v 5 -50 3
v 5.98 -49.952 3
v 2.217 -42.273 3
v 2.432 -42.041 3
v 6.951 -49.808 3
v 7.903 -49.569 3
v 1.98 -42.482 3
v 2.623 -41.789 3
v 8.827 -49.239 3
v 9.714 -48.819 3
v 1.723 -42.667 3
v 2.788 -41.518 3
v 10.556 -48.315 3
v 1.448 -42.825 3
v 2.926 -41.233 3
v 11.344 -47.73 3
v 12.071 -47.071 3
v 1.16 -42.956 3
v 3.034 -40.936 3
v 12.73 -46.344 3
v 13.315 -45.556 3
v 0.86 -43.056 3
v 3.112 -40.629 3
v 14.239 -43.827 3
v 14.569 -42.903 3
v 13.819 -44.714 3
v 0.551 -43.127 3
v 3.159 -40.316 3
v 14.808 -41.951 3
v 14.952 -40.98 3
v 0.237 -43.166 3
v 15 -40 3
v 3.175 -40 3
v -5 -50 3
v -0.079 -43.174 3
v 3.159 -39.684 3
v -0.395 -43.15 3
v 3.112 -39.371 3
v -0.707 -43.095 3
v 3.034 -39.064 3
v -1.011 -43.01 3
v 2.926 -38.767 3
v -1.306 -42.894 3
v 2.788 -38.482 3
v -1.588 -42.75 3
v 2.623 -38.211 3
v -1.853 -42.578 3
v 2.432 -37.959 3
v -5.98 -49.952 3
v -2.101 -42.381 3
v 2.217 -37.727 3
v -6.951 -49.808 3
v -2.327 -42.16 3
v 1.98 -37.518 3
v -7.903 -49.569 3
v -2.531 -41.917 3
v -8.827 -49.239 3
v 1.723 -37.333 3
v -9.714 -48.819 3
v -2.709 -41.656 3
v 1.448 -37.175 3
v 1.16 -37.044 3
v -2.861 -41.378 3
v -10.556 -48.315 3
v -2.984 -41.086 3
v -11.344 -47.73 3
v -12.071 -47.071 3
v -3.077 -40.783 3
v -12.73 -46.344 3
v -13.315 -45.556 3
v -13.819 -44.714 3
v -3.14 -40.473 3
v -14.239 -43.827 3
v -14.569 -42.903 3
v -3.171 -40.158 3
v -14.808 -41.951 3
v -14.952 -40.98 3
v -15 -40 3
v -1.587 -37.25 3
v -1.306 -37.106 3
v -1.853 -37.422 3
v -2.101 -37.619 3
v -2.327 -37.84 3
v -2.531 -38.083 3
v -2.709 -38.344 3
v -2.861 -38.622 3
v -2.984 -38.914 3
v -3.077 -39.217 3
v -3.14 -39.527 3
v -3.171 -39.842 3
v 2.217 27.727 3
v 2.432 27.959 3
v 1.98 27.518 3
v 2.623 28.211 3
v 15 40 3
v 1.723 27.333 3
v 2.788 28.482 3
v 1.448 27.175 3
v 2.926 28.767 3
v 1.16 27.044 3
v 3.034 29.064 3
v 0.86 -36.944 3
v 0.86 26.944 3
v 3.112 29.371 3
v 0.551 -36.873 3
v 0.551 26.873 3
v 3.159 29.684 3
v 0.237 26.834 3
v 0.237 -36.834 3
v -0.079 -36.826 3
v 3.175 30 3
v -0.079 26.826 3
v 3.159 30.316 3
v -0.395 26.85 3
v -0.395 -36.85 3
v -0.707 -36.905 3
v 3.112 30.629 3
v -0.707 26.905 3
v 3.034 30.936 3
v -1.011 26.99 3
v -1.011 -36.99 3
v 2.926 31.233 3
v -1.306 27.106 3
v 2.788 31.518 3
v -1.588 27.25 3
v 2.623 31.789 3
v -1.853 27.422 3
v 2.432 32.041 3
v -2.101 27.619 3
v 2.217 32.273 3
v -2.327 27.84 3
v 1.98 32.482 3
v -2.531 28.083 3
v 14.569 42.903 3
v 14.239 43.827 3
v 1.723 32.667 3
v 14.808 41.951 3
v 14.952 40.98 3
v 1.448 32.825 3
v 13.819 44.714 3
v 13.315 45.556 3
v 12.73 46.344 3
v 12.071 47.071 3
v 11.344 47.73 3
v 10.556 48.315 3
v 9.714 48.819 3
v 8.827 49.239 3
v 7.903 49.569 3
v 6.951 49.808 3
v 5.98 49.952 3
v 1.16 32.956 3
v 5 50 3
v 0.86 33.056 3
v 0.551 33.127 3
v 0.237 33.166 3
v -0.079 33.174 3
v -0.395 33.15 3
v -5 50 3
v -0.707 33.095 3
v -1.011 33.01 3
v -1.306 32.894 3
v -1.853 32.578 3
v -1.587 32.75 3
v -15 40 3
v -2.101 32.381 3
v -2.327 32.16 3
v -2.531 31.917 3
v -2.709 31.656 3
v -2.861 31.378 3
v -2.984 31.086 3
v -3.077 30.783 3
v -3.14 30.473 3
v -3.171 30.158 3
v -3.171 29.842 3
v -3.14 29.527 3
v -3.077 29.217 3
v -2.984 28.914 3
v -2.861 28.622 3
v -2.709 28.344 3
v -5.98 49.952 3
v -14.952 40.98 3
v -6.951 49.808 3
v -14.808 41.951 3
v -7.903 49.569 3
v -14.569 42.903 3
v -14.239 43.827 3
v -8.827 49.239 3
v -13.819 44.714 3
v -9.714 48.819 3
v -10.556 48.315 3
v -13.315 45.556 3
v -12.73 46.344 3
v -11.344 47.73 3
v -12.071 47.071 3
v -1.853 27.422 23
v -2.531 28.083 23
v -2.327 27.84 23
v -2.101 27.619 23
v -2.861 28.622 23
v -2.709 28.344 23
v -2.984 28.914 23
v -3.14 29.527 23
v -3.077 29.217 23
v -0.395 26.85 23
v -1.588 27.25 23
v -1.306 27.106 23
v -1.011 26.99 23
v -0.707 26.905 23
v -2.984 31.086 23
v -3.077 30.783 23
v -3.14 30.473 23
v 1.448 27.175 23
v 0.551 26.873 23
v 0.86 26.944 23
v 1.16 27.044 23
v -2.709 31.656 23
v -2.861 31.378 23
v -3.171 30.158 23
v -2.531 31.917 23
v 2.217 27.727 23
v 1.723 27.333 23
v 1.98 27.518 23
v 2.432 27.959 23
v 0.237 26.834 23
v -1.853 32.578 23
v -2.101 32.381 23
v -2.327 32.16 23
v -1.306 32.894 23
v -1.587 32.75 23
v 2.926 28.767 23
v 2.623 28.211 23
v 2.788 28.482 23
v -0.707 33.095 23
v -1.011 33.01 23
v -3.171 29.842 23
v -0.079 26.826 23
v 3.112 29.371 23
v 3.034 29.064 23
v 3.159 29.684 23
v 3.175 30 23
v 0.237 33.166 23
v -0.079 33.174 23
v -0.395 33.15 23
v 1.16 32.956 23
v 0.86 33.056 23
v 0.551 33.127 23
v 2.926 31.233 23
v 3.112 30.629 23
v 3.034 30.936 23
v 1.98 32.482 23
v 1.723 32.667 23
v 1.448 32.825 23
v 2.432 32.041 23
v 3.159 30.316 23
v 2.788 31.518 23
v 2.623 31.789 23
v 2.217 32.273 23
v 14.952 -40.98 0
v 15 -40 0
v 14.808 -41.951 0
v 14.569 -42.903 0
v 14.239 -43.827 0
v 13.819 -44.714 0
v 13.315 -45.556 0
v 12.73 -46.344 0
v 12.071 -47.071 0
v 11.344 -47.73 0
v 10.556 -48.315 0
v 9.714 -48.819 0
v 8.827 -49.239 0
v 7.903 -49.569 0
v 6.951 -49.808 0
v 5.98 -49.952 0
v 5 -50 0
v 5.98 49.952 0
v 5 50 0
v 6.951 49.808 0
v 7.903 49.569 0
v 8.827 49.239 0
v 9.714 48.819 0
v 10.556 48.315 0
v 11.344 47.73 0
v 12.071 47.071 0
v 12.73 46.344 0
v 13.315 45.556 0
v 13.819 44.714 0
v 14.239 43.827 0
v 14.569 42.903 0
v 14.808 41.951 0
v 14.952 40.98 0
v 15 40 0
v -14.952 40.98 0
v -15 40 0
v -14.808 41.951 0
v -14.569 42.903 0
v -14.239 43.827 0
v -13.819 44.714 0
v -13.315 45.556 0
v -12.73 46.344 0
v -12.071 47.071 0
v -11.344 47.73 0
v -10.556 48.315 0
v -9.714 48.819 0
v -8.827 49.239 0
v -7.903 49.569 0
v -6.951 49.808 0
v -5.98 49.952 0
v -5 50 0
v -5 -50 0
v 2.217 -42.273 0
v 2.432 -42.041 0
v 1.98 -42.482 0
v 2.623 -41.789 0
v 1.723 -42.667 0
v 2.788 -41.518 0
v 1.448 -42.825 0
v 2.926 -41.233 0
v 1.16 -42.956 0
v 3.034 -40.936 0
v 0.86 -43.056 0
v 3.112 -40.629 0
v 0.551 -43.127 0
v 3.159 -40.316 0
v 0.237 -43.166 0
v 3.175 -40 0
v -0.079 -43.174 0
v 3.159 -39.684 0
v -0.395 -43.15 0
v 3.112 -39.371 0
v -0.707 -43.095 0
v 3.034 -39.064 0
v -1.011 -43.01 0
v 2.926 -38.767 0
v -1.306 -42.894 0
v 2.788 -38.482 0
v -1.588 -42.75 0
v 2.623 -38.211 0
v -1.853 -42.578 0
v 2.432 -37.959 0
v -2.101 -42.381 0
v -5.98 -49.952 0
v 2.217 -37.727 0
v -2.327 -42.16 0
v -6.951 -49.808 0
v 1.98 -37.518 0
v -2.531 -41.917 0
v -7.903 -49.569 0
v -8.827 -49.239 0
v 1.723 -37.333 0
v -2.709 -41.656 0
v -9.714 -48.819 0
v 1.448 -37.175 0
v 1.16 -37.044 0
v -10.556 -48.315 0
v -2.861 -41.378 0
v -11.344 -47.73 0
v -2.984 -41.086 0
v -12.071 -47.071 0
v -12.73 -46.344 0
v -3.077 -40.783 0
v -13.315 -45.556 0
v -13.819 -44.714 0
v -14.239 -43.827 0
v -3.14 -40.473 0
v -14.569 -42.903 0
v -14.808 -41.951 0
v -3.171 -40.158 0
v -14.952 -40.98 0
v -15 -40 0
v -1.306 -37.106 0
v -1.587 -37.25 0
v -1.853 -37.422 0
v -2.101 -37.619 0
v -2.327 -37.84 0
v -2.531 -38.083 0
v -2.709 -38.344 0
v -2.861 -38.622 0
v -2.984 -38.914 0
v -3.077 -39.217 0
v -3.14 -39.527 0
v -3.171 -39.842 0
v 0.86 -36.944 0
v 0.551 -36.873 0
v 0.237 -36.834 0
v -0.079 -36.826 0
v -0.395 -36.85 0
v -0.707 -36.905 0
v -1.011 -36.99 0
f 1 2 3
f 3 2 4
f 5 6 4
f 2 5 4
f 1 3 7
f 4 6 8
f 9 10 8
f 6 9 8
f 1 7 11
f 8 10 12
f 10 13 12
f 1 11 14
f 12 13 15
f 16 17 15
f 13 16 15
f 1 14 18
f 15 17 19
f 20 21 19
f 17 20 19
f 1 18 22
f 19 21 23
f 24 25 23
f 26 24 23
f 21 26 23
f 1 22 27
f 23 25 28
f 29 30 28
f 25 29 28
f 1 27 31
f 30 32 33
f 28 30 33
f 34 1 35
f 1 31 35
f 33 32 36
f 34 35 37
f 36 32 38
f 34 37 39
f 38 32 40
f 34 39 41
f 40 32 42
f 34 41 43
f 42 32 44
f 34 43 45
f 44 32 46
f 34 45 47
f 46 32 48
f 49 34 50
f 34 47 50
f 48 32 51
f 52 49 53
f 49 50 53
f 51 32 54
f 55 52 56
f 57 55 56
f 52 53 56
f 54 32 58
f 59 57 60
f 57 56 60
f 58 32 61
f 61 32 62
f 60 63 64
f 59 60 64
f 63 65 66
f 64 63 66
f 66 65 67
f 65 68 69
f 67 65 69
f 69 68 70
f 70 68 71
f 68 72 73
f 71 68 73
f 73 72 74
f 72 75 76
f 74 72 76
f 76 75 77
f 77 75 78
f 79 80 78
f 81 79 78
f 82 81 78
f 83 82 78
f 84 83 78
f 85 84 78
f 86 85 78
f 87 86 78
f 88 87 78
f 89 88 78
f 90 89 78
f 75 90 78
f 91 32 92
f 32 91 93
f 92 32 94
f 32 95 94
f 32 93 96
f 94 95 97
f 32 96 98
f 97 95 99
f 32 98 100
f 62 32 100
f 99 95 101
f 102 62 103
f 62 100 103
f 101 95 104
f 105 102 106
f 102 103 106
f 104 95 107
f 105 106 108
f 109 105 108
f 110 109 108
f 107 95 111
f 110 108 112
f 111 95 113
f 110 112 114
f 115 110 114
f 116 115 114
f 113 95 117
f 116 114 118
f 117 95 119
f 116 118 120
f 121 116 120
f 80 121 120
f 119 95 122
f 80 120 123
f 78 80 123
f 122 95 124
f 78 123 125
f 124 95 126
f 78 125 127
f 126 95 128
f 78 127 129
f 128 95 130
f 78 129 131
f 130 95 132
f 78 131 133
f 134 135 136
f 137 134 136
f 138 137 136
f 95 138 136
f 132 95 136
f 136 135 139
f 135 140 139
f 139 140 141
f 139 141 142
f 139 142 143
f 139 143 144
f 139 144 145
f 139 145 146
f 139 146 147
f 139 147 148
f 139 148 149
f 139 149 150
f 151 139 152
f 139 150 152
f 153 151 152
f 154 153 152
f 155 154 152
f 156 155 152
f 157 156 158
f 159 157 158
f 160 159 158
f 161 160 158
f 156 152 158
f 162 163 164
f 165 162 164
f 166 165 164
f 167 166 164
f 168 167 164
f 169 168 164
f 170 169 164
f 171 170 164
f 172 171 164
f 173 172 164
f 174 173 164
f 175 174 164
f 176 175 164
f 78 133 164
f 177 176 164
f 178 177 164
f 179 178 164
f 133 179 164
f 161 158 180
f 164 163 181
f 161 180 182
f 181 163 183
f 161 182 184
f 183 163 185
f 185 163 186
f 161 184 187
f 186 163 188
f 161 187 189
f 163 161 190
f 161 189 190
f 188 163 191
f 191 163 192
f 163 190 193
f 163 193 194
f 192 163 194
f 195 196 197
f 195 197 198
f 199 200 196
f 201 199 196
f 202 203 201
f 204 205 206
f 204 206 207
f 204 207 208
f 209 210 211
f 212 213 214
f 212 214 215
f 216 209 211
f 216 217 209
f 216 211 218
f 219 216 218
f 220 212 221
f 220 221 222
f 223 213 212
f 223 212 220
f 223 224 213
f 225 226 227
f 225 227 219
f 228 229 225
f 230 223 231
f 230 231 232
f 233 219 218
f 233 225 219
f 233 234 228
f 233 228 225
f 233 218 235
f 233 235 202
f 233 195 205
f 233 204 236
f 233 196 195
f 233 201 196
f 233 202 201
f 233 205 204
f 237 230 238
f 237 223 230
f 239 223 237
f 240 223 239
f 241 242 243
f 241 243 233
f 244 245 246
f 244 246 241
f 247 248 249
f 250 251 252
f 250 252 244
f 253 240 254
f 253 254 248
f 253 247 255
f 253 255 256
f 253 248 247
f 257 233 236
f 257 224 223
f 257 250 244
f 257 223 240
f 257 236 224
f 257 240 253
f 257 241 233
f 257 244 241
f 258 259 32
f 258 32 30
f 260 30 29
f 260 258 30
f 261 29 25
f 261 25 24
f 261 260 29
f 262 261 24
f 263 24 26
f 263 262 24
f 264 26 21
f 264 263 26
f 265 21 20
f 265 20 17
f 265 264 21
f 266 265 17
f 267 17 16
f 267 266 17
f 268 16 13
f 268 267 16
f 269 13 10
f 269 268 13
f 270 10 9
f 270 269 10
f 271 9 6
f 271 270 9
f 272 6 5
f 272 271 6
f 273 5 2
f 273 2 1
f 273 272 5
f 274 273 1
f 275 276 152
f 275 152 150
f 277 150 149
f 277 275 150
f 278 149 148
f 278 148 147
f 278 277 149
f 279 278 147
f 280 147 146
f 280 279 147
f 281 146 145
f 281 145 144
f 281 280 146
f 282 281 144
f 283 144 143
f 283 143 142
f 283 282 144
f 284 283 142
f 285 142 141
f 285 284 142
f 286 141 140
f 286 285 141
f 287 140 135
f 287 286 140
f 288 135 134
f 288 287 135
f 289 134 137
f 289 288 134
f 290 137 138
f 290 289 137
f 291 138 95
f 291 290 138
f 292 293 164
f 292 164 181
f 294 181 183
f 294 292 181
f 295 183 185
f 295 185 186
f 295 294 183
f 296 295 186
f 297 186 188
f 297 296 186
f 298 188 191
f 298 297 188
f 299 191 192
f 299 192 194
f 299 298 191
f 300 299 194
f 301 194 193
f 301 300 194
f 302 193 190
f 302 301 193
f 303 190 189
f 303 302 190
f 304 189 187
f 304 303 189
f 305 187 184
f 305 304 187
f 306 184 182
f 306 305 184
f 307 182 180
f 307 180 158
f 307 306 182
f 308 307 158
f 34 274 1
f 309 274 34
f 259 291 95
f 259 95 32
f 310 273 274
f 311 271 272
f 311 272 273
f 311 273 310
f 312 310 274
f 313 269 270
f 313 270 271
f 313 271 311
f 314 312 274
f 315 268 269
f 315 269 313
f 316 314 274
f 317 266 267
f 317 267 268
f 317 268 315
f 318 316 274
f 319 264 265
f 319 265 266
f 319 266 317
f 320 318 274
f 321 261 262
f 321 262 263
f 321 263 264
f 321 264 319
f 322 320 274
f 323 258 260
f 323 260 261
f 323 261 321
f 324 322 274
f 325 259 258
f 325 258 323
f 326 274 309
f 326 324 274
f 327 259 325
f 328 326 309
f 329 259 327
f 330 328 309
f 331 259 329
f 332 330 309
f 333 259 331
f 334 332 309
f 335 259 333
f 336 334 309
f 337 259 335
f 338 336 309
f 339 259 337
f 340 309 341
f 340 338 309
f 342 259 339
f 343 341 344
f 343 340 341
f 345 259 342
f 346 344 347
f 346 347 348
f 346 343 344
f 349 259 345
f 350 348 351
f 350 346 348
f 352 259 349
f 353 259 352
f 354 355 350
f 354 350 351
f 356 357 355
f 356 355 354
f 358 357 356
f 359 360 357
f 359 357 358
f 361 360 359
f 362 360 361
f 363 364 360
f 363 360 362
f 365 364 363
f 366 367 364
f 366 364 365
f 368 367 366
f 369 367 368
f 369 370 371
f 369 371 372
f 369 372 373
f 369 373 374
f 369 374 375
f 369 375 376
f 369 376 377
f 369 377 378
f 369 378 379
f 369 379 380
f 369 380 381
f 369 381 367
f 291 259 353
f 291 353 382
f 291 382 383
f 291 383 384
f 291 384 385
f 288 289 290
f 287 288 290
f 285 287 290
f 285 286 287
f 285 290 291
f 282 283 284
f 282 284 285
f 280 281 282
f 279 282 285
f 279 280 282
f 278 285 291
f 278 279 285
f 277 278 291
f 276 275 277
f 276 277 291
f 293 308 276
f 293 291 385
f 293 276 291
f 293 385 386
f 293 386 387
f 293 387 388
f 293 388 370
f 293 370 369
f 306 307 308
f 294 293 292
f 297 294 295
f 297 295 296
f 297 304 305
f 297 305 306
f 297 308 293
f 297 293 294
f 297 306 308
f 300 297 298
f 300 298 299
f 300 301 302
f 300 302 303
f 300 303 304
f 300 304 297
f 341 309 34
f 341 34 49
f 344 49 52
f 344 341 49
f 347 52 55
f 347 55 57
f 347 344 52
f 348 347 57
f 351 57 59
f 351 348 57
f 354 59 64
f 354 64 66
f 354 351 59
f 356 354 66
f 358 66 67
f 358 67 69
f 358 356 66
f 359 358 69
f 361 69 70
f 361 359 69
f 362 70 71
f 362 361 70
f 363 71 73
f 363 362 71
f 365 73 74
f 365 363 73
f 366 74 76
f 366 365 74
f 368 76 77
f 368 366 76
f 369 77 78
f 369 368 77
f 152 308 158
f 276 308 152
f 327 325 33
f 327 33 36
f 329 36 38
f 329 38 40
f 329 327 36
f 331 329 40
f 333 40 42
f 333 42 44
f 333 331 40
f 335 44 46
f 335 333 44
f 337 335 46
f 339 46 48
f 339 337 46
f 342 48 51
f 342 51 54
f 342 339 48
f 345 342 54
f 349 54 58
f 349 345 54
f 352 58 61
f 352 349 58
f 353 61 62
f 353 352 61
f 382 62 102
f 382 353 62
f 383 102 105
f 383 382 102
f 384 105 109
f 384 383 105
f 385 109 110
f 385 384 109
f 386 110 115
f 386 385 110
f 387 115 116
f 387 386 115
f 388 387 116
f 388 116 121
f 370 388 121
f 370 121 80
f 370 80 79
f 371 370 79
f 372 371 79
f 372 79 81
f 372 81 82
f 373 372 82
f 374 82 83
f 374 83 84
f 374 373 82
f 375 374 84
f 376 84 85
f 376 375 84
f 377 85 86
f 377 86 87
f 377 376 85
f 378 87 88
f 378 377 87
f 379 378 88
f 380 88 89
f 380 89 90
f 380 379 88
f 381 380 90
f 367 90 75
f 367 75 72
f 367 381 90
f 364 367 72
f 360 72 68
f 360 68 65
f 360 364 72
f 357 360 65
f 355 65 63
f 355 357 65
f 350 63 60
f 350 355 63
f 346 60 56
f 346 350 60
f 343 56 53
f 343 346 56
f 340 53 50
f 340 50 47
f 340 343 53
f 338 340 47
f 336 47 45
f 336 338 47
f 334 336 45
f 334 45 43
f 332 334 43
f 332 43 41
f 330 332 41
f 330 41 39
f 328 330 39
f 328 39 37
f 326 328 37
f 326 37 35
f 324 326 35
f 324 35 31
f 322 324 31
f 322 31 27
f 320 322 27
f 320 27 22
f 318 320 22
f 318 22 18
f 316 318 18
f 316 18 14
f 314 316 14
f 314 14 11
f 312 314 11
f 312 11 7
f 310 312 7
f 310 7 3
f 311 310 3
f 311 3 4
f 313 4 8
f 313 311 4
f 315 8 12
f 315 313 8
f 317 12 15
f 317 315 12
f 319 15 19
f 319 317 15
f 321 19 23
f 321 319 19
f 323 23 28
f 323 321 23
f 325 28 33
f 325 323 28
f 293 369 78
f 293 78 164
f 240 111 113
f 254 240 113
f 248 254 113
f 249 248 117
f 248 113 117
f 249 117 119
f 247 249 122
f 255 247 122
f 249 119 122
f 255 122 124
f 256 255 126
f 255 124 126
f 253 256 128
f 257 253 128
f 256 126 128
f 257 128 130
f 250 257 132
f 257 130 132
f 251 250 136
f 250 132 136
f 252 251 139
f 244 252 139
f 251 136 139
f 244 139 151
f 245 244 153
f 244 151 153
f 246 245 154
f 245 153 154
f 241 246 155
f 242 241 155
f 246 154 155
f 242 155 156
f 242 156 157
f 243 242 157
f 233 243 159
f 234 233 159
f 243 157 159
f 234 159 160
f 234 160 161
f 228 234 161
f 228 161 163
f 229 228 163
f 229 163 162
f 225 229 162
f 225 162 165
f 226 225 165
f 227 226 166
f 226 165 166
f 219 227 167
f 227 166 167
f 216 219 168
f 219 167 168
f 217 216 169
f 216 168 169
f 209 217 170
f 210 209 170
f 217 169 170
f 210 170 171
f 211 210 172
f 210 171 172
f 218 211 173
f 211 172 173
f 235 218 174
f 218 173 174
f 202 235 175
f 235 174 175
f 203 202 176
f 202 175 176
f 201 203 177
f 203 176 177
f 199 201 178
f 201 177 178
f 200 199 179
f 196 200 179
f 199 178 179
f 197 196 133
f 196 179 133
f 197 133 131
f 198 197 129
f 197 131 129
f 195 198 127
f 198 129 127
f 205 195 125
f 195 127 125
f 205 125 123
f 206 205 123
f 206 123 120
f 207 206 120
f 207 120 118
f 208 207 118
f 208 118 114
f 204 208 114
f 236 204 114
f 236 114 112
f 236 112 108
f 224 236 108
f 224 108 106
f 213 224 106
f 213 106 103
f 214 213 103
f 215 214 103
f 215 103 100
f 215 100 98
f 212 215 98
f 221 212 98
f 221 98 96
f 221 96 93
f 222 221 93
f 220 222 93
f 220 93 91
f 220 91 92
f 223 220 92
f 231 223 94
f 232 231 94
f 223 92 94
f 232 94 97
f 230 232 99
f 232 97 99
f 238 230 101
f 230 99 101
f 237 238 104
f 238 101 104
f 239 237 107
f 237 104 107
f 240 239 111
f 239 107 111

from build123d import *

# Parameters (mm, degrees)
CROQUIS1_R              = 3.175
SALIENTE_EXTRUIR1_DEPTH = 3
CROQUIS2_R              = 3.175
SALIENTE_EXTRUIR2_DEPTH = 20


with BuildPart() as part:
    # Croquis1 → Saliente-Extruir1 (new body)
    with BuildSketch(Plane.XY):
        with BuildLine():
            Line((5, -50), (-5, -50))
            ThreePointArc((-5, -50), (-12.071067812, -47.071067812), (-15, -40))
            Line((-15, -40), (-15, 40))
            ThreePointArc((-15, 40), (-12.071067812, 47.071067812), (-5, 50))
            Line((-5, 50), (5, 50))
            ThreePointArc((5, 50), (12.071067812, 47.071067812), (15, 40))
            Line((15, 40), (15, -40))
            ThreePointArc((15, -40), (12.071067812, -47.071067812), (5, -50))
        make_face()
        with Locations((0, -40)):
            Circle(CROQUIS1_R, mode=Mode.SUBTRACT)
    extrude(amount=SALIENTE_EXTRUIR1_DEPTH)

    # Croquis2 → Saliente-Extruir2 (add)
    with BuildSketch(Plane.XY.offset(3)):
        with Locations((0, 30)):
            Circle(CROQUIS2_R)
    extrude(amount=SALIENTE_EXTRUIR2_DEPTH)


solid = part.part
